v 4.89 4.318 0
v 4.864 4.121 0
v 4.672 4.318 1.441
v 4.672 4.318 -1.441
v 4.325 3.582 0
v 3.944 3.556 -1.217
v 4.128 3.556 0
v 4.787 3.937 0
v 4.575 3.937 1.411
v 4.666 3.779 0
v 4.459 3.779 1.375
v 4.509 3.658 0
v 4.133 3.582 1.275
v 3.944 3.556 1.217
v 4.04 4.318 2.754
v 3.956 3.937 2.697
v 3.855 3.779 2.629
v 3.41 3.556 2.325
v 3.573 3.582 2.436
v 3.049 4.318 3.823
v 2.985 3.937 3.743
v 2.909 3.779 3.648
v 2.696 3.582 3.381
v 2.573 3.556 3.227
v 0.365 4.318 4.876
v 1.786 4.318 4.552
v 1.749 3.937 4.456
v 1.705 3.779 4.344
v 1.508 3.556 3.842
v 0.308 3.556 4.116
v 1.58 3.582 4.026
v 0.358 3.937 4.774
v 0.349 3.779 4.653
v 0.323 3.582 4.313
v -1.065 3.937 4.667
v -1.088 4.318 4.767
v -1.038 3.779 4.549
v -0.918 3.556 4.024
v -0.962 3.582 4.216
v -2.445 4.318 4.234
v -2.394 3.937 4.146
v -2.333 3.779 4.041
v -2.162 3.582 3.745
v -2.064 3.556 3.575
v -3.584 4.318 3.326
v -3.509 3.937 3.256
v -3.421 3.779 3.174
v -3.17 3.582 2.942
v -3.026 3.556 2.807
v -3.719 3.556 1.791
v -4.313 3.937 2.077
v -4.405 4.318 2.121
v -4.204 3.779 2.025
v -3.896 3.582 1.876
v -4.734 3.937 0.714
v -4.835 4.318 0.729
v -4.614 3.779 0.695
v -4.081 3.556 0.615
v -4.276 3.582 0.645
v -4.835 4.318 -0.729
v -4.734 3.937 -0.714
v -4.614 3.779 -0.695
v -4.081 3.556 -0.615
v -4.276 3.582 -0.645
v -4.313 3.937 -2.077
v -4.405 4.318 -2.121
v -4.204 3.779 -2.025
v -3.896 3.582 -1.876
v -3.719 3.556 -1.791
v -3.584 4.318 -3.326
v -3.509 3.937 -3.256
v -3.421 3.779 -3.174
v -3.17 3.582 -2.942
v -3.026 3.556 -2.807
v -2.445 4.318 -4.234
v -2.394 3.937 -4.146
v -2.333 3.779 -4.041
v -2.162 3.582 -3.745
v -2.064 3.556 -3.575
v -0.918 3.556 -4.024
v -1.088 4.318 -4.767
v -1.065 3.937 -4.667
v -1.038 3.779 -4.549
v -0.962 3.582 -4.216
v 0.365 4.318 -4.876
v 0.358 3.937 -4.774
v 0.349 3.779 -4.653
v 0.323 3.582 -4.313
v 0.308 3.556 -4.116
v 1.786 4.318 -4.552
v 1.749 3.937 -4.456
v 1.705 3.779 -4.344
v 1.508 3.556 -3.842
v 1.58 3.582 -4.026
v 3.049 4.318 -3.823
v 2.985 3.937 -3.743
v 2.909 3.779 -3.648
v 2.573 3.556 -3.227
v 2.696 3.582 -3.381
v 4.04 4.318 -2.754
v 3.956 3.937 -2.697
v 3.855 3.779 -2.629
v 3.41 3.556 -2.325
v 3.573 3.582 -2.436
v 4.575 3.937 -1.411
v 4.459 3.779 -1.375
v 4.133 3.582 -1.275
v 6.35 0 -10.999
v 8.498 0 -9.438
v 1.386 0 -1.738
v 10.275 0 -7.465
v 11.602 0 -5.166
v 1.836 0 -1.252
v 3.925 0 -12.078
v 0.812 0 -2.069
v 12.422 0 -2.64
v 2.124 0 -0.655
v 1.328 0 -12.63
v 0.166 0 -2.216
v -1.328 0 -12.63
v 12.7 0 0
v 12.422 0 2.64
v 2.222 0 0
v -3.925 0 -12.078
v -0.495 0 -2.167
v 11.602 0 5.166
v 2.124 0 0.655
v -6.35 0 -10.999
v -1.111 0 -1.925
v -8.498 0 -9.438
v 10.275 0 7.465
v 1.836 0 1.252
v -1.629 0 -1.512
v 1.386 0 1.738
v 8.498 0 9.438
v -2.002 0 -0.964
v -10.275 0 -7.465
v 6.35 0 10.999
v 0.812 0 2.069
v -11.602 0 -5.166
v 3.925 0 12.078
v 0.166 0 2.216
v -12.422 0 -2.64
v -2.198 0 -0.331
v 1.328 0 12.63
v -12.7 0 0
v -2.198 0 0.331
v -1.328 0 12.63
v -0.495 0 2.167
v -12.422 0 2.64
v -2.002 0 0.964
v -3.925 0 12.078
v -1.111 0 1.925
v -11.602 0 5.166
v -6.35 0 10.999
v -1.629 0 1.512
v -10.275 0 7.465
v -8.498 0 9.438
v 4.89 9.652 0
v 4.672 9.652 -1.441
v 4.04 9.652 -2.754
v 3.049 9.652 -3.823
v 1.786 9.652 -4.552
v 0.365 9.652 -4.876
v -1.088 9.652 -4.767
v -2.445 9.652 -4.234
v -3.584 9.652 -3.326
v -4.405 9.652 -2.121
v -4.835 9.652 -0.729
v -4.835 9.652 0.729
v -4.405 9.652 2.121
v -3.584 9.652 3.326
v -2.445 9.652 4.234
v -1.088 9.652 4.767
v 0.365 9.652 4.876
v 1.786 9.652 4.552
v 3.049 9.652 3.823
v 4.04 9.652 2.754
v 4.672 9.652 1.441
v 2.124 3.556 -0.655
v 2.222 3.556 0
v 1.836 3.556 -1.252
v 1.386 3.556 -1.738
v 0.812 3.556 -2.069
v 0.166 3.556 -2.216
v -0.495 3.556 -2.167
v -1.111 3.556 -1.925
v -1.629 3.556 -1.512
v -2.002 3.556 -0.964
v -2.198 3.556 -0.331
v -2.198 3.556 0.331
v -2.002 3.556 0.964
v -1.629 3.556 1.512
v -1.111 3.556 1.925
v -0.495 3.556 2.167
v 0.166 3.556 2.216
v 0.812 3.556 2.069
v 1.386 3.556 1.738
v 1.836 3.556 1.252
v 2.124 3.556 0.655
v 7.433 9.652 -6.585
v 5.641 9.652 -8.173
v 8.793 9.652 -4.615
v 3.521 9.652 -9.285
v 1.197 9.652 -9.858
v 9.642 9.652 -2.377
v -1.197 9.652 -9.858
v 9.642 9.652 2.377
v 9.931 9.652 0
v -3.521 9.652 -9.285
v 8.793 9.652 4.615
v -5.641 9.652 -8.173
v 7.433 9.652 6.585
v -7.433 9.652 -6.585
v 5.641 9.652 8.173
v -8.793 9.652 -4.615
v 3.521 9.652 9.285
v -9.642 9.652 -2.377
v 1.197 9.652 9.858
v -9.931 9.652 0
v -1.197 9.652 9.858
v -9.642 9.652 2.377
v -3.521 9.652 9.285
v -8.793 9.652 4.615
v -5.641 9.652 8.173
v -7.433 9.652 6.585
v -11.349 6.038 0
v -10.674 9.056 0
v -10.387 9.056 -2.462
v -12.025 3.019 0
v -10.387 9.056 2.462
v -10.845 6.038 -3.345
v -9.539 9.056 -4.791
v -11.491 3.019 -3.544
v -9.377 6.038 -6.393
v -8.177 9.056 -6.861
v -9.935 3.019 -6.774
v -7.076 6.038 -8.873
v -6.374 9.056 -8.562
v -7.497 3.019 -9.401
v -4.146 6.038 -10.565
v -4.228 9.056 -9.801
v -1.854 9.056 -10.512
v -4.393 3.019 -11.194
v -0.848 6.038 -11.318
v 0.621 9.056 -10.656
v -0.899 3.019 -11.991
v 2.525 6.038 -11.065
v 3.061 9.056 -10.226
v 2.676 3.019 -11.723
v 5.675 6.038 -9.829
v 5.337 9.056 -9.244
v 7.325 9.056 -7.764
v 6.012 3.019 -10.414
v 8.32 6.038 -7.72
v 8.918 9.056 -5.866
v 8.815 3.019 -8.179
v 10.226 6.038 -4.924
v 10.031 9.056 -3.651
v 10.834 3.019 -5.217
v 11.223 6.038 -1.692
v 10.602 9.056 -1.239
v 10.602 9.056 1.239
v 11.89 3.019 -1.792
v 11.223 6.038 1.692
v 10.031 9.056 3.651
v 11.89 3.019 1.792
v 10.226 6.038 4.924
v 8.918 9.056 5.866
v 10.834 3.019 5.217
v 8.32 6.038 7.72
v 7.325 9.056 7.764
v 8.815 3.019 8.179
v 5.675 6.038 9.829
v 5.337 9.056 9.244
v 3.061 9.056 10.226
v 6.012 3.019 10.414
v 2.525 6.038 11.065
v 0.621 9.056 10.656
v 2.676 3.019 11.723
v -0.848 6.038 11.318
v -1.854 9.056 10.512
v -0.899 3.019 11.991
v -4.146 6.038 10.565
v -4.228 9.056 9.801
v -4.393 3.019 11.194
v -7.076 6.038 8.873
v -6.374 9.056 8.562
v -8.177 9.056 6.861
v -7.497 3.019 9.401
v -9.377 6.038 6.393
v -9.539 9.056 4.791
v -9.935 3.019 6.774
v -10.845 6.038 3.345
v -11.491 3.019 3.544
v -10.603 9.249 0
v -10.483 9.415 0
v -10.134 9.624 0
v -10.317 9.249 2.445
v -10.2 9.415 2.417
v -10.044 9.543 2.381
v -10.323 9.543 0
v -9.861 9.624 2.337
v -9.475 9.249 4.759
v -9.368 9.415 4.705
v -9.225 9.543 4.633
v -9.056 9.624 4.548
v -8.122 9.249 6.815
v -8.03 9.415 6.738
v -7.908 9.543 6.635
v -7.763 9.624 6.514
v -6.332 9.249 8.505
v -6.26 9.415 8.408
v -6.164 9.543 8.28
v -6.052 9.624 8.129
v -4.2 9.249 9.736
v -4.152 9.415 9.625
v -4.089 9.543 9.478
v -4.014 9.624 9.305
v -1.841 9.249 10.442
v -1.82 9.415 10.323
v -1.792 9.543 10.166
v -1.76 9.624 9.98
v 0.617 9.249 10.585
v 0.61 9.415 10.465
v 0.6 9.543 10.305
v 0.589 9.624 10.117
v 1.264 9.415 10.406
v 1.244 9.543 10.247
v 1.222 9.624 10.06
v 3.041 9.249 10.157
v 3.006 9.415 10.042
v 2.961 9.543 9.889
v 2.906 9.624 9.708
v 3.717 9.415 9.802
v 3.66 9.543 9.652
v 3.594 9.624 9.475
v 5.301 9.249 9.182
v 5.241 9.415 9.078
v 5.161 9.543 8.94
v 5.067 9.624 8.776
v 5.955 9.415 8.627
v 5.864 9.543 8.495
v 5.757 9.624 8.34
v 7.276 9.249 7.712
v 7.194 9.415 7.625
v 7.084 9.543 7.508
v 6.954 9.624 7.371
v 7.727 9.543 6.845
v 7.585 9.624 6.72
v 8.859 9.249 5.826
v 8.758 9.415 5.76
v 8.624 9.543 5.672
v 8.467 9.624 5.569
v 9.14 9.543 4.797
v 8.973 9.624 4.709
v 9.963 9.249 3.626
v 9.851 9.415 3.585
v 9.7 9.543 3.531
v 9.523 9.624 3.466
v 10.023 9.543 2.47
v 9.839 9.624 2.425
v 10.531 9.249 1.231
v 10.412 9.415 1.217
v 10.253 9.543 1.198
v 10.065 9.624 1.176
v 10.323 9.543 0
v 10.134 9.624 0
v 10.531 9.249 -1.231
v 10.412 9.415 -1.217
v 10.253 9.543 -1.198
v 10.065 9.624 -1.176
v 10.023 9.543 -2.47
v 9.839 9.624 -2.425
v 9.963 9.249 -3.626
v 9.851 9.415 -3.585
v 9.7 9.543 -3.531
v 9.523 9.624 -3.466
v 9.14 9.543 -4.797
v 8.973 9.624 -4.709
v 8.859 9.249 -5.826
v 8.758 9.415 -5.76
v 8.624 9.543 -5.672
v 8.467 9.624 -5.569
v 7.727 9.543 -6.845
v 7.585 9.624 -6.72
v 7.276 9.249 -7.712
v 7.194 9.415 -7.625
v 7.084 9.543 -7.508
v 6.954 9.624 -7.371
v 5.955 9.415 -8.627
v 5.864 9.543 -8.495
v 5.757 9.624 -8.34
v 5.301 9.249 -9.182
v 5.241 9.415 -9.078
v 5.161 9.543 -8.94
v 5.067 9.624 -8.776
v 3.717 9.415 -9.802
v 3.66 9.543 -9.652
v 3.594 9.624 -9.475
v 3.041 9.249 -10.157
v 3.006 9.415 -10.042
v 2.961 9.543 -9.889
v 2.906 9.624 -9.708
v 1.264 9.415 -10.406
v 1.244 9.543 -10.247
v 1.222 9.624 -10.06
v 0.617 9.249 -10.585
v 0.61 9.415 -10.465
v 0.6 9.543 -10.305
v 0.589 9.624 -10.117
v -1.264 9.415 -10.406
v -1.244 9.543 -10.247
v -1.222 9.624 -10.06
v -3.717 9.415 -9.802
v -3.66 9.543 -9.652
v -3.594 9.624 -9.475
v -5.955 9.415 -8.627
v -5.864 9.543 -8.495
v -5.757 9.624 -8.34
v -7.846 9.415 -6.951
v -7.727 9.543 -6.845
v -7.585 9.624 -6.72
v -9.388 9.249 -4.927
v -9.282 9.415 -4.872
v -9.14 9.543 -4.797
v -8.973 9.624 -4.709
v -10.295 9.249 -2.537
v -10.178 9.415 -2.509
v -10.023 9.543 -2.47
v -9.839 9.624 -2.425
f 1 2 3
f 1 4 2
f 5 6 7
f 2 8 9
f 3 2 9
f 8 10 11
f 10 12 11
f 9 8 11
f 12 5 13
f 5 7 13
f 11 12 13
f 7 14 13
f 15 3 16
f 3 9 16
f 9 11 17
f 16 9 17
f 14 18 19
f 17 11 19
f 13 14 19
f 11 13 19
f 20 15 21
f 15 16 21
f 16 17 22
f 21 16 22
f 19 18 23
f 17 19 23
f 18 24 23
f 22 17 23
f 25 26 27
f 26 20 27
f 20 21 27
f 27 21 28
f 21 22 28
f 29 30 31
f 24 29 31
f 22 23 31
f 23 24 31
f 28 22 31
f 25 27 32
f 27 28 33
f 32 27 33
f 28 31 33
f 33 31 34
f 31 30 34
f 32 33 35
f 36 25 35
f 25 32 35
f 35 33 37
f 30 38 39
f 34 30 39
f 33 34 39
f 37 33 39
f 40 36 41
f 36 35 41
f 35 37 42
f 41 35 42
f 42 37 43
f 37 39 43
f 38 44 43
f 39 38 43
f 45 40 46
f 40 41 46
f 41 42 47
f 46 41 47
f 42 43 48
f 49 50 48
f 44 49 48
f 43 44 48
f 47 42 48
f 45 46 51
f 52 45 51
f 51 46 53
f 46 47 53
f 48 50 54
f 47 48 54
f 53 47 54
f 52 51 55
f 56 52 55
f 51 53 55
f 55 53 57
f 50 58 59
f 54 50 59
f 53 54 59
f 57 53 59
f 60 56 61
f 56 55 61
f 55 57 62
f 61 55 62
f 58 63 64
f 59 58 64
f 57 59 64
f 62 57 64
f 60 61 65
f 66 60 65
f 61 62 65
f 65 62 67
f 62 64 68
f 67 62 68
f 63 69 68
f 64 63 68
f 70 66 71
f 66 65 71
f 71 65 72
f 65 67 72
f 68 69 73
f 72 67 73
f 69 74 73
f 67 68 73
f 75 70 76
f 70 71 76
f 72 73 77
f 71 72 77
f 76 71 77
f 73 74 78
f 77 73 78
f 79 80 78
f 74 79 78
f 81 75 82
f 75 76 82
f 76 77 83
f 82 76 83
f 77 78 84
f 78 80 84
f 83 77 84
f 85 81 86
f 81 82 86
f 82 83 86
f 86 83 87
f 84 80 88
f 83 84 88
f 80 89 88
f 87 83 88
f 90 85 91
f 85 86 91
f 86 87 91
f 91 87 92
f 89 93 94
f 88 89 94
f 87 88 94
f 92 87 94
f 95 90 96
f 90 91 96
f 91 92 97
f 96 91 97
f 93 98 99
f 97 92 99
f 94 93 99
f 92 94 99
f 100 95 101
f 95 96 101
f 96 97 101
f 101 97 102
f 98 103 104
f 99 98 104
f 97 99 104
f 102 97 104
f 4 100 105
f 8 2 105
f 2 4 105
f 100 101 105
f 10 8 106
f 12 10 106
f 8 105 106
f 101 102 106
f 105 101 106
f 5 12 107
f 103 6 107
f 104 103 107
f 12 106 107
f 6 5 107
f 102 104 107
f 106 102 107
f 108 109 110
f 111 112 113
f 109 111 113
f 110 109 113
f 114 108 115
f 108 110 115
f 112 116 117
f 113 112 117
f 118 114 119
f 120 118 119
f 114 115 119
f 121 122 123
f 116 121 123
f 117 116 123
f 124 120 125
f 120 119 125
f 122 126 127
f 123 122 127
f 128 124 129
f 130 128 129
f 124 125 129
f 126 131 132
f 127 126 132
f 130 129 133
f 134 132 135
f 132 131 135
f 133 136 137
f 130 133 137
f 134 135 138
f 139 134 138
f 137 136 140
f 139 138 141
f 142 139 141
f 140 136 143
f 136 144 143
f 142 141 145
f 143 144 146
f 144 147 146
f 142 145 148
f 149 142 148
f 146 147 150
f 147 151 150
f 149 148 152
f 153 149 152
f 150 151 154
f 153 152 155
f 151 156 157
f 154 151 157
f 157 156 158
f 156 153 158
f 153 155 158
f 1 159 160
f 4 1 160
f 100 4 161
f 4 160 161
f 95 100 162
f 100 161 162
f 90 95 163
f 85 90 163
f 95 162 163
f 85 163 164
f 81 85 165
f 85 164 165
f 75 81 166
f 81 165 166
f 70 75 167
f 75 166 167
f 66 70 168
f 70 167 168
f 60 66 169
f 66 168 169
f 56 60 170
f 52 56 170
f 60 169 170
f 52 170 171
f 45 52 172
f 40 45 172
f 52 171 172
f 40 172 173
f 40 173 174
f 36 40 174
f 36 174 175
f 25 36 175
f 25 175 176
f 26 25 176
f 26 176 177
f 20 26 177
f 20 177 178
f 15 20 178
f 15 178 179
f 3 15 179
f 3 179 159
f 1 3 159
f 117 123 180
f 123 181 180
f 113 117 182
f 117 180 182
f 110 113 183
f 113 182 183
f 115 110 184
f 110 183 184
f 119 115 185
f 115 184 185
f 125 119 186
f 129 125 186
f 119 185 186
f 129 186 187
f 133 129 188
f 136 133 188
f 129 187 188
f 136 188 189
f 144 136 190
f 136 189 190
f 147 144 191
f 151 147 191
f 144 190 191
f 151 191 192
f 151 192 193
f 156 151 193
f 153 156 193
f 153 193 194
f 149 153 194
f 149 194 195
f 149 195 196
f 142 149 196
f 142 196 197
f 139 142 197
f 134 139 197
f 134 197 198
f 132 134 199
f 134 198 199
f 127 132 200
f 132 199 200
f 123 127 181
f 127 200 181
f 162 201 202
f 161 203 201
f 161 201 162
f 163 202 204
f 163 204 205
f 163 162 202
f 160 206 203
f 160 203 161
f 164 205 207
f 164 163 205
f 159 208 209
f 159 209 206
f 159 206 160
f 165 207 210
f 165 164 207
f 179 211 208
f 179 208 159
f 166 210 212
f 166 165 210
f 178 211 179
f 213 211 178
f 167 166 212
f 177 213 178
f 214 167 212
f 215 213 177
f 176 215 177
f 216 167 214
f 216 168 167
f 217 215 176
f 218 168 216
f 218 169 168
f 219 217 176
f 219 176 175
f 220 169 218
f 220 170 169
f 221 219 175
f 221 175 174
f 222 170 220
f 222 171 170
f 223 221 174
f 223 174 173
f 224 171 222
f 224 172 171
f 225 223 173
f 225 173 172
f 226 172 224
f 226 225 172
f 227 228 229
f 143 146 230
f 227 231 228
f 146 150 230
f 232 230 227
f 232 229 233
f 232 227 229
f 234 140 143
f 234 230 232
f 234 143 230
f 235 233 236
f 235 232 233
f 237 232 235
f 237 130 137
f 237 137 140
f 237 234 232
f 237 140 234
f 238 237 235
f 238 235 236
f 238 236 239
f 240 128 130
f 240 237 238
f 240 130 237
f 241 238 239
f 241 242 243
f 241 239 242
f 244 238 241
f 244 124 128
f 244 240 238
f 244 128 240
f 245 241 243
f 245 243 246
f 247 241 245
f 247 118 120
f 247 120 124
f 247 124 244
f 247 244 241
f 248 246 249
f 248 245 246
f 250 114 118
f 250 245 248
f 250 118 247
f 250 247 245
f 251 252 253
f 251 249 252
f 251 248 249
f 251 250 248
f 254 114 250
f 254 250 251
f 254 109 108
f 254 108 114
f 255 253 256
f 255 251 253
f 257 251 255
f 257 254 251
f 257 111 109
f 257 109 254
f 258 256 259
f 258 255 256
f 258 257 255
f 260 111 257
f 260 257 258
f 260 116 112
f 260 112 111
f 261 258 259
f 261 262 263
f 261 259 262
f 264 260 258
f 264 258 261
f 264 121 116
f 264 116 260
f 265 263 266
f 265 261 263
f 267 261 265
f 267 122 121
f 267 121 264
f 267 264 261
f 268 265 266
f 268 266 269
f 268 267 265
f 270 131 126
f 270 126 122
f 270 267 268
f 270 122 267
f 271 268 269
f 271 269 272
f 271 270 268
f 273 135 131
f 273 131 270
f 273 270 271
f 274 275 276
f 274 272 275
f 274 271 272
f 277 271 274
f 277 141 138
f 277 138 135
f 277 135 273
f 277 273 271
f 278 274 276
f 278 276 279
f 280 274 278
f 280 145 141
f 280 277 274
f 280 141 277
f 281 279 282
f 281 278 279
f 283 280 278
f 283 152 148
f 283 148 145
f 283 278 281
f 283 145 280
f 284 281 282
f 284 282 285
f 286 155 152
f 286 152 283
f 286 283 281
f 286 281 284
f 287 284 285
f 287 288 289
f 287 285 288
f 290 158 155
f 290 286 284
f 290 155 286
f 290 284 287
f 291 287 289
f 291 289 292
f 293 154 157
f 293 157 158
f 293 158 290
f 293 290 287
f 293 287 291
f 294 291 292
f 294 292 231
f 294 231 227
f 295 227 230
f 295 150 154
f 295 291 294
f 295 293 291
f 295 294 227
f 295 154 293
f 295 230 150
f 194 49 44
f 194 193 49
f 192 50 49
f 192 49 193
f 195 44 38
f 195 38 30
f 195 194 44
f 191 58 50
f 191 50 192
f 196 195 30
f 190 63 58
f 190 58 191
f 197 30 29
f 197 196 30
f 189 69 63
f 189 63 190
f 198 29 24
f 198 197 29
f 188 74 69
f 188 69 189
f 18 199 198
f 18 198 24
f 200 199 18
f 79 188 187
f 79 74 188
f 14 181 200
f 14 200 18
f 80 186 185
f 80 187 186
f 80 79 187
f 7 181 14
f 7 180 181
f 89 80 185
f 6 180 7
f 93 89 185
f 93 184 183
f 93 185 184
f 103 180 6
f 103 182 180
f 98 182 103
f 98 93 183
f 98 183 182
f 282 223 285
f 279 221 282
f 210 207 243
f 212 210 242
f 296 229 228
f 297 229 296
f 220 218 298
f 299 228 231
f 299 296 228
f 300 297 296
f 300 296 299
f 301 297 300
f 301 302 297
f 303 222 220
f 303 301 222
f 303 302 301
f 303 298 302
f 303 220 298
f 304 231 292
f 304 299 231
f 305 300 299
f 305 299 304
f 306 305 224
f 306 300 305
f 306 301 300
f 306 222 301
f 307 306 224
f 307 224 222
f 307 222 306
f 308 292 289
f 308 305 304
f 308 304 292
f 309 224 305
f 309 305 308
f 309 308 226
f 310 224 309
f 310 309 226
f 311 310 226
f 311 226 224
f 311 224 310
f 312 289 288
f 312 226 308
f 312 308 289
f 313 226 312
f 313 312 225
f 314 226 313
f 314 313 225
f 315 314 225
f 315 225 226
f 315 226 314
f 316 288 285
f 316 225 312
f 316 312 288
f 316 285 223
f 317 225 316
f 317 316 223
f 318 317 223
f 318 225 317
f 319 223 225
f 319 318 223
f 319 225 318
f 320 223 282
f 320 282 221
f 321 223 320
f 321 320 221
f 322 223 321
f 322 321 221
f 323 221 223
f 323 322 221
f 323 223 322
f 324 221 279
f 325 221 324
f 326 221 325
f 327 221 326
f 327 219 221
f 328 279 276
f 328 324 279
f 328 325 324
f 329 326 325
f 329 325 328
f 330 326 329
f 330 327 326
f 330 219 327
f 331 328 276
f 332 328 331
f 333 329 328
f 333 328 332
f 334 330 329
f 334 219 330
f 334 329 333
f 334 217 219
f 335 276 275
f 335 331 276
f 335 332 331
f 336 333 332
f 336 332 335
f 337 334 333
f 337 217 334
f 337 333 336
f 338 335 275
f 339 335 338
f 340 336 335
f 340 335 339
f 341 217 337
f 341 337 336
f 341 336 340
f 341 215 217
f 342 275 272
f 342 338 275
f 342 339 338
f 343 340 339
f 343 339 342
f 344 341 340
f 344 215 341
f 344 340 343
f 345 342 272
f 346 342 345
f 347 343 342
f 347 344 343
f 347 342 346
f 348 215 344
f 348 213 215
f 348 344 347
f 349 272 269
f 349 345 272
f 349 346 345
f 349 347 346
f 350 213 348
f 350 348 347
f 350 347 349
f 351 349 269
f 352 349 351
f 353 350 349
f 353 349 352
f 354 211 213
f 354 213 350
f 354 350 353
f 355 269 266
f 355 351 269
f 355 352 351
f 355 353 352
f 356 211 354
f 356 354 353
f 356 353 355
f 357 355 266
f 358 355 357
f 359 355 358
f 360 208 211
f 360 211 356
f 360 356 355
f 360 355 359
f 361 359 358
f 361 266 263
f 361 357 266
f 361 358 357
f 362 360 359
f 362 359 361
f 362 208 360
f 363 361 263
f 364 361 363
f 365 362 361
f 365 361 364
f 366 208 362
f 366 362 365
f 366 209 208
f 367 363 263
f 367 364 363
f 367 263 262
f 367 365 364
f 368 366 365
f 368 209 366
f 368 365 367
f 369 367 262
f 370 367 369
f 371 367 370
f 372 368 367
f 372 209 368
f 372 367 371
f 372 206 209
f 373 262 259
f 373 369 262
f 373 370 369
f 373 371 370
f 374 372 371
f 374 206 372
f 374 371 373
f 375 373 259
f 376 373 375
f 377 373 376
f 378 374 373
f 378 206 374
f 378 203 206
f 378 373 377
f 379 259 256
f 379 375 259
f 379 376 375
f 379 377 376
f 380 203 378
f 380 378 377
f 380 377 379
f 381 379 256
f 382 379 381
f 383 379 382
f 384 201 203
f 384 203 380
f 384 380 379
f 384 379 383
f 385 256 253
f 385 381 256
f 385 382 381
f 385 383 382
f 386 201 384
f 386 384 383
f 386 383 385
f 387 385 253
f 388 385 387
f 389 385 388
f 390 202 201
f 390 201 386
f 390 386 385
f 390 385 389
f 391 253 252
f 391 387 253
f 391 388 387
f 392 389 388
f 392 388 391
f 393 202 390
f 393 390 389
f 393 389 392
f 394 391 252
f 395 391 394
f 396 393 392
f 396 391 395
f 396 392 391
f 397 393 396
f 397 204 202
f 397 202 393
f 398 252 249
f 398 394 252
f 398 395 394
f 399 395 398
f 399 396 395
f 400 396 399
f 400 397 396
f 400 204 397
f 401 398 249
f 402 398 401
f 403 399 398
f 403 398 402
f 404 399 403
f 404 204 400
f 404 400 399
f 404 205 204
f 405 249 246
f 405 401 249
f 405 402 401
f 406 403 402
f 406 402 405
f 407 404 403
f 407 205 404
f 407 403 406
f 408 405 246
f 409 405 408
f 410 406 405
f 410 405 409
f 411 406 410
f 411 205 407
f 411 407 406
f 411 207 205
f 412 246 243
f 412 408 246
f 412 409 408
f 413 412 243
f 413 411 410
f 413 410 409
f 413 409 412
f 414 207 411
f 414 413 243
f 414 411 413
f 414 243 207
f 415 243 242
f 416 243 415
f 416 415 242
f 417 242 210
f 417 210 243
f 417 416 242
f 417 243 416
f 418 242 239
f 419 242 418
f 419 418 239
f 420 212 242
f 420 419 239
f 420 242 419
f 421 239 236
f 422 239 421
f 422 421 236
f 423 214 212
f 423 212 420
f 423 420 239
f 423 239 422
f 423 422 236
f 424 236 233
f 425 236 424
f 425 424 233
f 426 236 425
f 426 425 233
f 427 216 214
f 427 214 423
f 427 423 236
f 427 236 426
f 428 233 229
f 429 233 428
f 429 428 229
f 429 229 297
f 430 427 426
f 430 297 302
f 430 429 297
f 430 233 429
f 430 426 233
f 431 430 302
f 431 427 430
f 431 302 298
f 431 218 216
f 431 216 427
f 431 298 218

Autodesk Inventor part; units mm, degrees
ref_plane "YZ Plane" through (0, 0, 0) normal (1, 0, 0) x (0, 1, 0)
ref_plane "XY Plane" through (0, 0, 0) normal (0, 0, 1) x (1, 0, 0)
sketch "Sketch1" plane through (0, 0, 0) normal (0, 1, 0) x (-1, 0, 0)
  circle A0 centre (0, 0) radius 12.7
  circle A1 centre (0, 0) radius 2.2225
  dimension "d0" = 25.4
  dimension "d1" = 4.445
ref_plane "Work Plane1" through (0, 9.652, 0) normal (0, 1, 0) x (-1, 0, 0)
sketch "Sketch2" plane through (0, 9.652, 0) normal (0, 1, 0) x (-1, 0, 0)
  circle A0 centre (0, 0) radius 2.2238
  circle A1 centre (0, 0) radius 10.541
  dimension "d3" = 21.082
loft "Loft1" add profiles "Sketch1", "Sketch2" contours A0 | A1 / A0 | A1
sketch "Sketch3" plane through (0, 9.652, 0) normal (0, 1, 0) x (1, 0, 0)
  circle A0 centre (0, 0) radius 2.2225
  dimension "d8" = 4.445
extrude "Extrusion1" cut sketch "Sketch3" against normal blind 25.4
sketch "Sketch4" plane through (0, 9.652, 0) normal (0, 1, 0) x (1, 0, 0)
  circle A0 centre (0, 0) radius 4.8895
  dimension "d11" = 9.779
extrude "Extrusion2" cut sketch "Sketch4" against normal blind 6.096
fillet "Fillet1" radius 0.762 2 edges at (10.541, 9.652, 0) (-4.8895, 3.556, 0)
properties part number "Soft Feet" material "Polystyrene, High Impact"
